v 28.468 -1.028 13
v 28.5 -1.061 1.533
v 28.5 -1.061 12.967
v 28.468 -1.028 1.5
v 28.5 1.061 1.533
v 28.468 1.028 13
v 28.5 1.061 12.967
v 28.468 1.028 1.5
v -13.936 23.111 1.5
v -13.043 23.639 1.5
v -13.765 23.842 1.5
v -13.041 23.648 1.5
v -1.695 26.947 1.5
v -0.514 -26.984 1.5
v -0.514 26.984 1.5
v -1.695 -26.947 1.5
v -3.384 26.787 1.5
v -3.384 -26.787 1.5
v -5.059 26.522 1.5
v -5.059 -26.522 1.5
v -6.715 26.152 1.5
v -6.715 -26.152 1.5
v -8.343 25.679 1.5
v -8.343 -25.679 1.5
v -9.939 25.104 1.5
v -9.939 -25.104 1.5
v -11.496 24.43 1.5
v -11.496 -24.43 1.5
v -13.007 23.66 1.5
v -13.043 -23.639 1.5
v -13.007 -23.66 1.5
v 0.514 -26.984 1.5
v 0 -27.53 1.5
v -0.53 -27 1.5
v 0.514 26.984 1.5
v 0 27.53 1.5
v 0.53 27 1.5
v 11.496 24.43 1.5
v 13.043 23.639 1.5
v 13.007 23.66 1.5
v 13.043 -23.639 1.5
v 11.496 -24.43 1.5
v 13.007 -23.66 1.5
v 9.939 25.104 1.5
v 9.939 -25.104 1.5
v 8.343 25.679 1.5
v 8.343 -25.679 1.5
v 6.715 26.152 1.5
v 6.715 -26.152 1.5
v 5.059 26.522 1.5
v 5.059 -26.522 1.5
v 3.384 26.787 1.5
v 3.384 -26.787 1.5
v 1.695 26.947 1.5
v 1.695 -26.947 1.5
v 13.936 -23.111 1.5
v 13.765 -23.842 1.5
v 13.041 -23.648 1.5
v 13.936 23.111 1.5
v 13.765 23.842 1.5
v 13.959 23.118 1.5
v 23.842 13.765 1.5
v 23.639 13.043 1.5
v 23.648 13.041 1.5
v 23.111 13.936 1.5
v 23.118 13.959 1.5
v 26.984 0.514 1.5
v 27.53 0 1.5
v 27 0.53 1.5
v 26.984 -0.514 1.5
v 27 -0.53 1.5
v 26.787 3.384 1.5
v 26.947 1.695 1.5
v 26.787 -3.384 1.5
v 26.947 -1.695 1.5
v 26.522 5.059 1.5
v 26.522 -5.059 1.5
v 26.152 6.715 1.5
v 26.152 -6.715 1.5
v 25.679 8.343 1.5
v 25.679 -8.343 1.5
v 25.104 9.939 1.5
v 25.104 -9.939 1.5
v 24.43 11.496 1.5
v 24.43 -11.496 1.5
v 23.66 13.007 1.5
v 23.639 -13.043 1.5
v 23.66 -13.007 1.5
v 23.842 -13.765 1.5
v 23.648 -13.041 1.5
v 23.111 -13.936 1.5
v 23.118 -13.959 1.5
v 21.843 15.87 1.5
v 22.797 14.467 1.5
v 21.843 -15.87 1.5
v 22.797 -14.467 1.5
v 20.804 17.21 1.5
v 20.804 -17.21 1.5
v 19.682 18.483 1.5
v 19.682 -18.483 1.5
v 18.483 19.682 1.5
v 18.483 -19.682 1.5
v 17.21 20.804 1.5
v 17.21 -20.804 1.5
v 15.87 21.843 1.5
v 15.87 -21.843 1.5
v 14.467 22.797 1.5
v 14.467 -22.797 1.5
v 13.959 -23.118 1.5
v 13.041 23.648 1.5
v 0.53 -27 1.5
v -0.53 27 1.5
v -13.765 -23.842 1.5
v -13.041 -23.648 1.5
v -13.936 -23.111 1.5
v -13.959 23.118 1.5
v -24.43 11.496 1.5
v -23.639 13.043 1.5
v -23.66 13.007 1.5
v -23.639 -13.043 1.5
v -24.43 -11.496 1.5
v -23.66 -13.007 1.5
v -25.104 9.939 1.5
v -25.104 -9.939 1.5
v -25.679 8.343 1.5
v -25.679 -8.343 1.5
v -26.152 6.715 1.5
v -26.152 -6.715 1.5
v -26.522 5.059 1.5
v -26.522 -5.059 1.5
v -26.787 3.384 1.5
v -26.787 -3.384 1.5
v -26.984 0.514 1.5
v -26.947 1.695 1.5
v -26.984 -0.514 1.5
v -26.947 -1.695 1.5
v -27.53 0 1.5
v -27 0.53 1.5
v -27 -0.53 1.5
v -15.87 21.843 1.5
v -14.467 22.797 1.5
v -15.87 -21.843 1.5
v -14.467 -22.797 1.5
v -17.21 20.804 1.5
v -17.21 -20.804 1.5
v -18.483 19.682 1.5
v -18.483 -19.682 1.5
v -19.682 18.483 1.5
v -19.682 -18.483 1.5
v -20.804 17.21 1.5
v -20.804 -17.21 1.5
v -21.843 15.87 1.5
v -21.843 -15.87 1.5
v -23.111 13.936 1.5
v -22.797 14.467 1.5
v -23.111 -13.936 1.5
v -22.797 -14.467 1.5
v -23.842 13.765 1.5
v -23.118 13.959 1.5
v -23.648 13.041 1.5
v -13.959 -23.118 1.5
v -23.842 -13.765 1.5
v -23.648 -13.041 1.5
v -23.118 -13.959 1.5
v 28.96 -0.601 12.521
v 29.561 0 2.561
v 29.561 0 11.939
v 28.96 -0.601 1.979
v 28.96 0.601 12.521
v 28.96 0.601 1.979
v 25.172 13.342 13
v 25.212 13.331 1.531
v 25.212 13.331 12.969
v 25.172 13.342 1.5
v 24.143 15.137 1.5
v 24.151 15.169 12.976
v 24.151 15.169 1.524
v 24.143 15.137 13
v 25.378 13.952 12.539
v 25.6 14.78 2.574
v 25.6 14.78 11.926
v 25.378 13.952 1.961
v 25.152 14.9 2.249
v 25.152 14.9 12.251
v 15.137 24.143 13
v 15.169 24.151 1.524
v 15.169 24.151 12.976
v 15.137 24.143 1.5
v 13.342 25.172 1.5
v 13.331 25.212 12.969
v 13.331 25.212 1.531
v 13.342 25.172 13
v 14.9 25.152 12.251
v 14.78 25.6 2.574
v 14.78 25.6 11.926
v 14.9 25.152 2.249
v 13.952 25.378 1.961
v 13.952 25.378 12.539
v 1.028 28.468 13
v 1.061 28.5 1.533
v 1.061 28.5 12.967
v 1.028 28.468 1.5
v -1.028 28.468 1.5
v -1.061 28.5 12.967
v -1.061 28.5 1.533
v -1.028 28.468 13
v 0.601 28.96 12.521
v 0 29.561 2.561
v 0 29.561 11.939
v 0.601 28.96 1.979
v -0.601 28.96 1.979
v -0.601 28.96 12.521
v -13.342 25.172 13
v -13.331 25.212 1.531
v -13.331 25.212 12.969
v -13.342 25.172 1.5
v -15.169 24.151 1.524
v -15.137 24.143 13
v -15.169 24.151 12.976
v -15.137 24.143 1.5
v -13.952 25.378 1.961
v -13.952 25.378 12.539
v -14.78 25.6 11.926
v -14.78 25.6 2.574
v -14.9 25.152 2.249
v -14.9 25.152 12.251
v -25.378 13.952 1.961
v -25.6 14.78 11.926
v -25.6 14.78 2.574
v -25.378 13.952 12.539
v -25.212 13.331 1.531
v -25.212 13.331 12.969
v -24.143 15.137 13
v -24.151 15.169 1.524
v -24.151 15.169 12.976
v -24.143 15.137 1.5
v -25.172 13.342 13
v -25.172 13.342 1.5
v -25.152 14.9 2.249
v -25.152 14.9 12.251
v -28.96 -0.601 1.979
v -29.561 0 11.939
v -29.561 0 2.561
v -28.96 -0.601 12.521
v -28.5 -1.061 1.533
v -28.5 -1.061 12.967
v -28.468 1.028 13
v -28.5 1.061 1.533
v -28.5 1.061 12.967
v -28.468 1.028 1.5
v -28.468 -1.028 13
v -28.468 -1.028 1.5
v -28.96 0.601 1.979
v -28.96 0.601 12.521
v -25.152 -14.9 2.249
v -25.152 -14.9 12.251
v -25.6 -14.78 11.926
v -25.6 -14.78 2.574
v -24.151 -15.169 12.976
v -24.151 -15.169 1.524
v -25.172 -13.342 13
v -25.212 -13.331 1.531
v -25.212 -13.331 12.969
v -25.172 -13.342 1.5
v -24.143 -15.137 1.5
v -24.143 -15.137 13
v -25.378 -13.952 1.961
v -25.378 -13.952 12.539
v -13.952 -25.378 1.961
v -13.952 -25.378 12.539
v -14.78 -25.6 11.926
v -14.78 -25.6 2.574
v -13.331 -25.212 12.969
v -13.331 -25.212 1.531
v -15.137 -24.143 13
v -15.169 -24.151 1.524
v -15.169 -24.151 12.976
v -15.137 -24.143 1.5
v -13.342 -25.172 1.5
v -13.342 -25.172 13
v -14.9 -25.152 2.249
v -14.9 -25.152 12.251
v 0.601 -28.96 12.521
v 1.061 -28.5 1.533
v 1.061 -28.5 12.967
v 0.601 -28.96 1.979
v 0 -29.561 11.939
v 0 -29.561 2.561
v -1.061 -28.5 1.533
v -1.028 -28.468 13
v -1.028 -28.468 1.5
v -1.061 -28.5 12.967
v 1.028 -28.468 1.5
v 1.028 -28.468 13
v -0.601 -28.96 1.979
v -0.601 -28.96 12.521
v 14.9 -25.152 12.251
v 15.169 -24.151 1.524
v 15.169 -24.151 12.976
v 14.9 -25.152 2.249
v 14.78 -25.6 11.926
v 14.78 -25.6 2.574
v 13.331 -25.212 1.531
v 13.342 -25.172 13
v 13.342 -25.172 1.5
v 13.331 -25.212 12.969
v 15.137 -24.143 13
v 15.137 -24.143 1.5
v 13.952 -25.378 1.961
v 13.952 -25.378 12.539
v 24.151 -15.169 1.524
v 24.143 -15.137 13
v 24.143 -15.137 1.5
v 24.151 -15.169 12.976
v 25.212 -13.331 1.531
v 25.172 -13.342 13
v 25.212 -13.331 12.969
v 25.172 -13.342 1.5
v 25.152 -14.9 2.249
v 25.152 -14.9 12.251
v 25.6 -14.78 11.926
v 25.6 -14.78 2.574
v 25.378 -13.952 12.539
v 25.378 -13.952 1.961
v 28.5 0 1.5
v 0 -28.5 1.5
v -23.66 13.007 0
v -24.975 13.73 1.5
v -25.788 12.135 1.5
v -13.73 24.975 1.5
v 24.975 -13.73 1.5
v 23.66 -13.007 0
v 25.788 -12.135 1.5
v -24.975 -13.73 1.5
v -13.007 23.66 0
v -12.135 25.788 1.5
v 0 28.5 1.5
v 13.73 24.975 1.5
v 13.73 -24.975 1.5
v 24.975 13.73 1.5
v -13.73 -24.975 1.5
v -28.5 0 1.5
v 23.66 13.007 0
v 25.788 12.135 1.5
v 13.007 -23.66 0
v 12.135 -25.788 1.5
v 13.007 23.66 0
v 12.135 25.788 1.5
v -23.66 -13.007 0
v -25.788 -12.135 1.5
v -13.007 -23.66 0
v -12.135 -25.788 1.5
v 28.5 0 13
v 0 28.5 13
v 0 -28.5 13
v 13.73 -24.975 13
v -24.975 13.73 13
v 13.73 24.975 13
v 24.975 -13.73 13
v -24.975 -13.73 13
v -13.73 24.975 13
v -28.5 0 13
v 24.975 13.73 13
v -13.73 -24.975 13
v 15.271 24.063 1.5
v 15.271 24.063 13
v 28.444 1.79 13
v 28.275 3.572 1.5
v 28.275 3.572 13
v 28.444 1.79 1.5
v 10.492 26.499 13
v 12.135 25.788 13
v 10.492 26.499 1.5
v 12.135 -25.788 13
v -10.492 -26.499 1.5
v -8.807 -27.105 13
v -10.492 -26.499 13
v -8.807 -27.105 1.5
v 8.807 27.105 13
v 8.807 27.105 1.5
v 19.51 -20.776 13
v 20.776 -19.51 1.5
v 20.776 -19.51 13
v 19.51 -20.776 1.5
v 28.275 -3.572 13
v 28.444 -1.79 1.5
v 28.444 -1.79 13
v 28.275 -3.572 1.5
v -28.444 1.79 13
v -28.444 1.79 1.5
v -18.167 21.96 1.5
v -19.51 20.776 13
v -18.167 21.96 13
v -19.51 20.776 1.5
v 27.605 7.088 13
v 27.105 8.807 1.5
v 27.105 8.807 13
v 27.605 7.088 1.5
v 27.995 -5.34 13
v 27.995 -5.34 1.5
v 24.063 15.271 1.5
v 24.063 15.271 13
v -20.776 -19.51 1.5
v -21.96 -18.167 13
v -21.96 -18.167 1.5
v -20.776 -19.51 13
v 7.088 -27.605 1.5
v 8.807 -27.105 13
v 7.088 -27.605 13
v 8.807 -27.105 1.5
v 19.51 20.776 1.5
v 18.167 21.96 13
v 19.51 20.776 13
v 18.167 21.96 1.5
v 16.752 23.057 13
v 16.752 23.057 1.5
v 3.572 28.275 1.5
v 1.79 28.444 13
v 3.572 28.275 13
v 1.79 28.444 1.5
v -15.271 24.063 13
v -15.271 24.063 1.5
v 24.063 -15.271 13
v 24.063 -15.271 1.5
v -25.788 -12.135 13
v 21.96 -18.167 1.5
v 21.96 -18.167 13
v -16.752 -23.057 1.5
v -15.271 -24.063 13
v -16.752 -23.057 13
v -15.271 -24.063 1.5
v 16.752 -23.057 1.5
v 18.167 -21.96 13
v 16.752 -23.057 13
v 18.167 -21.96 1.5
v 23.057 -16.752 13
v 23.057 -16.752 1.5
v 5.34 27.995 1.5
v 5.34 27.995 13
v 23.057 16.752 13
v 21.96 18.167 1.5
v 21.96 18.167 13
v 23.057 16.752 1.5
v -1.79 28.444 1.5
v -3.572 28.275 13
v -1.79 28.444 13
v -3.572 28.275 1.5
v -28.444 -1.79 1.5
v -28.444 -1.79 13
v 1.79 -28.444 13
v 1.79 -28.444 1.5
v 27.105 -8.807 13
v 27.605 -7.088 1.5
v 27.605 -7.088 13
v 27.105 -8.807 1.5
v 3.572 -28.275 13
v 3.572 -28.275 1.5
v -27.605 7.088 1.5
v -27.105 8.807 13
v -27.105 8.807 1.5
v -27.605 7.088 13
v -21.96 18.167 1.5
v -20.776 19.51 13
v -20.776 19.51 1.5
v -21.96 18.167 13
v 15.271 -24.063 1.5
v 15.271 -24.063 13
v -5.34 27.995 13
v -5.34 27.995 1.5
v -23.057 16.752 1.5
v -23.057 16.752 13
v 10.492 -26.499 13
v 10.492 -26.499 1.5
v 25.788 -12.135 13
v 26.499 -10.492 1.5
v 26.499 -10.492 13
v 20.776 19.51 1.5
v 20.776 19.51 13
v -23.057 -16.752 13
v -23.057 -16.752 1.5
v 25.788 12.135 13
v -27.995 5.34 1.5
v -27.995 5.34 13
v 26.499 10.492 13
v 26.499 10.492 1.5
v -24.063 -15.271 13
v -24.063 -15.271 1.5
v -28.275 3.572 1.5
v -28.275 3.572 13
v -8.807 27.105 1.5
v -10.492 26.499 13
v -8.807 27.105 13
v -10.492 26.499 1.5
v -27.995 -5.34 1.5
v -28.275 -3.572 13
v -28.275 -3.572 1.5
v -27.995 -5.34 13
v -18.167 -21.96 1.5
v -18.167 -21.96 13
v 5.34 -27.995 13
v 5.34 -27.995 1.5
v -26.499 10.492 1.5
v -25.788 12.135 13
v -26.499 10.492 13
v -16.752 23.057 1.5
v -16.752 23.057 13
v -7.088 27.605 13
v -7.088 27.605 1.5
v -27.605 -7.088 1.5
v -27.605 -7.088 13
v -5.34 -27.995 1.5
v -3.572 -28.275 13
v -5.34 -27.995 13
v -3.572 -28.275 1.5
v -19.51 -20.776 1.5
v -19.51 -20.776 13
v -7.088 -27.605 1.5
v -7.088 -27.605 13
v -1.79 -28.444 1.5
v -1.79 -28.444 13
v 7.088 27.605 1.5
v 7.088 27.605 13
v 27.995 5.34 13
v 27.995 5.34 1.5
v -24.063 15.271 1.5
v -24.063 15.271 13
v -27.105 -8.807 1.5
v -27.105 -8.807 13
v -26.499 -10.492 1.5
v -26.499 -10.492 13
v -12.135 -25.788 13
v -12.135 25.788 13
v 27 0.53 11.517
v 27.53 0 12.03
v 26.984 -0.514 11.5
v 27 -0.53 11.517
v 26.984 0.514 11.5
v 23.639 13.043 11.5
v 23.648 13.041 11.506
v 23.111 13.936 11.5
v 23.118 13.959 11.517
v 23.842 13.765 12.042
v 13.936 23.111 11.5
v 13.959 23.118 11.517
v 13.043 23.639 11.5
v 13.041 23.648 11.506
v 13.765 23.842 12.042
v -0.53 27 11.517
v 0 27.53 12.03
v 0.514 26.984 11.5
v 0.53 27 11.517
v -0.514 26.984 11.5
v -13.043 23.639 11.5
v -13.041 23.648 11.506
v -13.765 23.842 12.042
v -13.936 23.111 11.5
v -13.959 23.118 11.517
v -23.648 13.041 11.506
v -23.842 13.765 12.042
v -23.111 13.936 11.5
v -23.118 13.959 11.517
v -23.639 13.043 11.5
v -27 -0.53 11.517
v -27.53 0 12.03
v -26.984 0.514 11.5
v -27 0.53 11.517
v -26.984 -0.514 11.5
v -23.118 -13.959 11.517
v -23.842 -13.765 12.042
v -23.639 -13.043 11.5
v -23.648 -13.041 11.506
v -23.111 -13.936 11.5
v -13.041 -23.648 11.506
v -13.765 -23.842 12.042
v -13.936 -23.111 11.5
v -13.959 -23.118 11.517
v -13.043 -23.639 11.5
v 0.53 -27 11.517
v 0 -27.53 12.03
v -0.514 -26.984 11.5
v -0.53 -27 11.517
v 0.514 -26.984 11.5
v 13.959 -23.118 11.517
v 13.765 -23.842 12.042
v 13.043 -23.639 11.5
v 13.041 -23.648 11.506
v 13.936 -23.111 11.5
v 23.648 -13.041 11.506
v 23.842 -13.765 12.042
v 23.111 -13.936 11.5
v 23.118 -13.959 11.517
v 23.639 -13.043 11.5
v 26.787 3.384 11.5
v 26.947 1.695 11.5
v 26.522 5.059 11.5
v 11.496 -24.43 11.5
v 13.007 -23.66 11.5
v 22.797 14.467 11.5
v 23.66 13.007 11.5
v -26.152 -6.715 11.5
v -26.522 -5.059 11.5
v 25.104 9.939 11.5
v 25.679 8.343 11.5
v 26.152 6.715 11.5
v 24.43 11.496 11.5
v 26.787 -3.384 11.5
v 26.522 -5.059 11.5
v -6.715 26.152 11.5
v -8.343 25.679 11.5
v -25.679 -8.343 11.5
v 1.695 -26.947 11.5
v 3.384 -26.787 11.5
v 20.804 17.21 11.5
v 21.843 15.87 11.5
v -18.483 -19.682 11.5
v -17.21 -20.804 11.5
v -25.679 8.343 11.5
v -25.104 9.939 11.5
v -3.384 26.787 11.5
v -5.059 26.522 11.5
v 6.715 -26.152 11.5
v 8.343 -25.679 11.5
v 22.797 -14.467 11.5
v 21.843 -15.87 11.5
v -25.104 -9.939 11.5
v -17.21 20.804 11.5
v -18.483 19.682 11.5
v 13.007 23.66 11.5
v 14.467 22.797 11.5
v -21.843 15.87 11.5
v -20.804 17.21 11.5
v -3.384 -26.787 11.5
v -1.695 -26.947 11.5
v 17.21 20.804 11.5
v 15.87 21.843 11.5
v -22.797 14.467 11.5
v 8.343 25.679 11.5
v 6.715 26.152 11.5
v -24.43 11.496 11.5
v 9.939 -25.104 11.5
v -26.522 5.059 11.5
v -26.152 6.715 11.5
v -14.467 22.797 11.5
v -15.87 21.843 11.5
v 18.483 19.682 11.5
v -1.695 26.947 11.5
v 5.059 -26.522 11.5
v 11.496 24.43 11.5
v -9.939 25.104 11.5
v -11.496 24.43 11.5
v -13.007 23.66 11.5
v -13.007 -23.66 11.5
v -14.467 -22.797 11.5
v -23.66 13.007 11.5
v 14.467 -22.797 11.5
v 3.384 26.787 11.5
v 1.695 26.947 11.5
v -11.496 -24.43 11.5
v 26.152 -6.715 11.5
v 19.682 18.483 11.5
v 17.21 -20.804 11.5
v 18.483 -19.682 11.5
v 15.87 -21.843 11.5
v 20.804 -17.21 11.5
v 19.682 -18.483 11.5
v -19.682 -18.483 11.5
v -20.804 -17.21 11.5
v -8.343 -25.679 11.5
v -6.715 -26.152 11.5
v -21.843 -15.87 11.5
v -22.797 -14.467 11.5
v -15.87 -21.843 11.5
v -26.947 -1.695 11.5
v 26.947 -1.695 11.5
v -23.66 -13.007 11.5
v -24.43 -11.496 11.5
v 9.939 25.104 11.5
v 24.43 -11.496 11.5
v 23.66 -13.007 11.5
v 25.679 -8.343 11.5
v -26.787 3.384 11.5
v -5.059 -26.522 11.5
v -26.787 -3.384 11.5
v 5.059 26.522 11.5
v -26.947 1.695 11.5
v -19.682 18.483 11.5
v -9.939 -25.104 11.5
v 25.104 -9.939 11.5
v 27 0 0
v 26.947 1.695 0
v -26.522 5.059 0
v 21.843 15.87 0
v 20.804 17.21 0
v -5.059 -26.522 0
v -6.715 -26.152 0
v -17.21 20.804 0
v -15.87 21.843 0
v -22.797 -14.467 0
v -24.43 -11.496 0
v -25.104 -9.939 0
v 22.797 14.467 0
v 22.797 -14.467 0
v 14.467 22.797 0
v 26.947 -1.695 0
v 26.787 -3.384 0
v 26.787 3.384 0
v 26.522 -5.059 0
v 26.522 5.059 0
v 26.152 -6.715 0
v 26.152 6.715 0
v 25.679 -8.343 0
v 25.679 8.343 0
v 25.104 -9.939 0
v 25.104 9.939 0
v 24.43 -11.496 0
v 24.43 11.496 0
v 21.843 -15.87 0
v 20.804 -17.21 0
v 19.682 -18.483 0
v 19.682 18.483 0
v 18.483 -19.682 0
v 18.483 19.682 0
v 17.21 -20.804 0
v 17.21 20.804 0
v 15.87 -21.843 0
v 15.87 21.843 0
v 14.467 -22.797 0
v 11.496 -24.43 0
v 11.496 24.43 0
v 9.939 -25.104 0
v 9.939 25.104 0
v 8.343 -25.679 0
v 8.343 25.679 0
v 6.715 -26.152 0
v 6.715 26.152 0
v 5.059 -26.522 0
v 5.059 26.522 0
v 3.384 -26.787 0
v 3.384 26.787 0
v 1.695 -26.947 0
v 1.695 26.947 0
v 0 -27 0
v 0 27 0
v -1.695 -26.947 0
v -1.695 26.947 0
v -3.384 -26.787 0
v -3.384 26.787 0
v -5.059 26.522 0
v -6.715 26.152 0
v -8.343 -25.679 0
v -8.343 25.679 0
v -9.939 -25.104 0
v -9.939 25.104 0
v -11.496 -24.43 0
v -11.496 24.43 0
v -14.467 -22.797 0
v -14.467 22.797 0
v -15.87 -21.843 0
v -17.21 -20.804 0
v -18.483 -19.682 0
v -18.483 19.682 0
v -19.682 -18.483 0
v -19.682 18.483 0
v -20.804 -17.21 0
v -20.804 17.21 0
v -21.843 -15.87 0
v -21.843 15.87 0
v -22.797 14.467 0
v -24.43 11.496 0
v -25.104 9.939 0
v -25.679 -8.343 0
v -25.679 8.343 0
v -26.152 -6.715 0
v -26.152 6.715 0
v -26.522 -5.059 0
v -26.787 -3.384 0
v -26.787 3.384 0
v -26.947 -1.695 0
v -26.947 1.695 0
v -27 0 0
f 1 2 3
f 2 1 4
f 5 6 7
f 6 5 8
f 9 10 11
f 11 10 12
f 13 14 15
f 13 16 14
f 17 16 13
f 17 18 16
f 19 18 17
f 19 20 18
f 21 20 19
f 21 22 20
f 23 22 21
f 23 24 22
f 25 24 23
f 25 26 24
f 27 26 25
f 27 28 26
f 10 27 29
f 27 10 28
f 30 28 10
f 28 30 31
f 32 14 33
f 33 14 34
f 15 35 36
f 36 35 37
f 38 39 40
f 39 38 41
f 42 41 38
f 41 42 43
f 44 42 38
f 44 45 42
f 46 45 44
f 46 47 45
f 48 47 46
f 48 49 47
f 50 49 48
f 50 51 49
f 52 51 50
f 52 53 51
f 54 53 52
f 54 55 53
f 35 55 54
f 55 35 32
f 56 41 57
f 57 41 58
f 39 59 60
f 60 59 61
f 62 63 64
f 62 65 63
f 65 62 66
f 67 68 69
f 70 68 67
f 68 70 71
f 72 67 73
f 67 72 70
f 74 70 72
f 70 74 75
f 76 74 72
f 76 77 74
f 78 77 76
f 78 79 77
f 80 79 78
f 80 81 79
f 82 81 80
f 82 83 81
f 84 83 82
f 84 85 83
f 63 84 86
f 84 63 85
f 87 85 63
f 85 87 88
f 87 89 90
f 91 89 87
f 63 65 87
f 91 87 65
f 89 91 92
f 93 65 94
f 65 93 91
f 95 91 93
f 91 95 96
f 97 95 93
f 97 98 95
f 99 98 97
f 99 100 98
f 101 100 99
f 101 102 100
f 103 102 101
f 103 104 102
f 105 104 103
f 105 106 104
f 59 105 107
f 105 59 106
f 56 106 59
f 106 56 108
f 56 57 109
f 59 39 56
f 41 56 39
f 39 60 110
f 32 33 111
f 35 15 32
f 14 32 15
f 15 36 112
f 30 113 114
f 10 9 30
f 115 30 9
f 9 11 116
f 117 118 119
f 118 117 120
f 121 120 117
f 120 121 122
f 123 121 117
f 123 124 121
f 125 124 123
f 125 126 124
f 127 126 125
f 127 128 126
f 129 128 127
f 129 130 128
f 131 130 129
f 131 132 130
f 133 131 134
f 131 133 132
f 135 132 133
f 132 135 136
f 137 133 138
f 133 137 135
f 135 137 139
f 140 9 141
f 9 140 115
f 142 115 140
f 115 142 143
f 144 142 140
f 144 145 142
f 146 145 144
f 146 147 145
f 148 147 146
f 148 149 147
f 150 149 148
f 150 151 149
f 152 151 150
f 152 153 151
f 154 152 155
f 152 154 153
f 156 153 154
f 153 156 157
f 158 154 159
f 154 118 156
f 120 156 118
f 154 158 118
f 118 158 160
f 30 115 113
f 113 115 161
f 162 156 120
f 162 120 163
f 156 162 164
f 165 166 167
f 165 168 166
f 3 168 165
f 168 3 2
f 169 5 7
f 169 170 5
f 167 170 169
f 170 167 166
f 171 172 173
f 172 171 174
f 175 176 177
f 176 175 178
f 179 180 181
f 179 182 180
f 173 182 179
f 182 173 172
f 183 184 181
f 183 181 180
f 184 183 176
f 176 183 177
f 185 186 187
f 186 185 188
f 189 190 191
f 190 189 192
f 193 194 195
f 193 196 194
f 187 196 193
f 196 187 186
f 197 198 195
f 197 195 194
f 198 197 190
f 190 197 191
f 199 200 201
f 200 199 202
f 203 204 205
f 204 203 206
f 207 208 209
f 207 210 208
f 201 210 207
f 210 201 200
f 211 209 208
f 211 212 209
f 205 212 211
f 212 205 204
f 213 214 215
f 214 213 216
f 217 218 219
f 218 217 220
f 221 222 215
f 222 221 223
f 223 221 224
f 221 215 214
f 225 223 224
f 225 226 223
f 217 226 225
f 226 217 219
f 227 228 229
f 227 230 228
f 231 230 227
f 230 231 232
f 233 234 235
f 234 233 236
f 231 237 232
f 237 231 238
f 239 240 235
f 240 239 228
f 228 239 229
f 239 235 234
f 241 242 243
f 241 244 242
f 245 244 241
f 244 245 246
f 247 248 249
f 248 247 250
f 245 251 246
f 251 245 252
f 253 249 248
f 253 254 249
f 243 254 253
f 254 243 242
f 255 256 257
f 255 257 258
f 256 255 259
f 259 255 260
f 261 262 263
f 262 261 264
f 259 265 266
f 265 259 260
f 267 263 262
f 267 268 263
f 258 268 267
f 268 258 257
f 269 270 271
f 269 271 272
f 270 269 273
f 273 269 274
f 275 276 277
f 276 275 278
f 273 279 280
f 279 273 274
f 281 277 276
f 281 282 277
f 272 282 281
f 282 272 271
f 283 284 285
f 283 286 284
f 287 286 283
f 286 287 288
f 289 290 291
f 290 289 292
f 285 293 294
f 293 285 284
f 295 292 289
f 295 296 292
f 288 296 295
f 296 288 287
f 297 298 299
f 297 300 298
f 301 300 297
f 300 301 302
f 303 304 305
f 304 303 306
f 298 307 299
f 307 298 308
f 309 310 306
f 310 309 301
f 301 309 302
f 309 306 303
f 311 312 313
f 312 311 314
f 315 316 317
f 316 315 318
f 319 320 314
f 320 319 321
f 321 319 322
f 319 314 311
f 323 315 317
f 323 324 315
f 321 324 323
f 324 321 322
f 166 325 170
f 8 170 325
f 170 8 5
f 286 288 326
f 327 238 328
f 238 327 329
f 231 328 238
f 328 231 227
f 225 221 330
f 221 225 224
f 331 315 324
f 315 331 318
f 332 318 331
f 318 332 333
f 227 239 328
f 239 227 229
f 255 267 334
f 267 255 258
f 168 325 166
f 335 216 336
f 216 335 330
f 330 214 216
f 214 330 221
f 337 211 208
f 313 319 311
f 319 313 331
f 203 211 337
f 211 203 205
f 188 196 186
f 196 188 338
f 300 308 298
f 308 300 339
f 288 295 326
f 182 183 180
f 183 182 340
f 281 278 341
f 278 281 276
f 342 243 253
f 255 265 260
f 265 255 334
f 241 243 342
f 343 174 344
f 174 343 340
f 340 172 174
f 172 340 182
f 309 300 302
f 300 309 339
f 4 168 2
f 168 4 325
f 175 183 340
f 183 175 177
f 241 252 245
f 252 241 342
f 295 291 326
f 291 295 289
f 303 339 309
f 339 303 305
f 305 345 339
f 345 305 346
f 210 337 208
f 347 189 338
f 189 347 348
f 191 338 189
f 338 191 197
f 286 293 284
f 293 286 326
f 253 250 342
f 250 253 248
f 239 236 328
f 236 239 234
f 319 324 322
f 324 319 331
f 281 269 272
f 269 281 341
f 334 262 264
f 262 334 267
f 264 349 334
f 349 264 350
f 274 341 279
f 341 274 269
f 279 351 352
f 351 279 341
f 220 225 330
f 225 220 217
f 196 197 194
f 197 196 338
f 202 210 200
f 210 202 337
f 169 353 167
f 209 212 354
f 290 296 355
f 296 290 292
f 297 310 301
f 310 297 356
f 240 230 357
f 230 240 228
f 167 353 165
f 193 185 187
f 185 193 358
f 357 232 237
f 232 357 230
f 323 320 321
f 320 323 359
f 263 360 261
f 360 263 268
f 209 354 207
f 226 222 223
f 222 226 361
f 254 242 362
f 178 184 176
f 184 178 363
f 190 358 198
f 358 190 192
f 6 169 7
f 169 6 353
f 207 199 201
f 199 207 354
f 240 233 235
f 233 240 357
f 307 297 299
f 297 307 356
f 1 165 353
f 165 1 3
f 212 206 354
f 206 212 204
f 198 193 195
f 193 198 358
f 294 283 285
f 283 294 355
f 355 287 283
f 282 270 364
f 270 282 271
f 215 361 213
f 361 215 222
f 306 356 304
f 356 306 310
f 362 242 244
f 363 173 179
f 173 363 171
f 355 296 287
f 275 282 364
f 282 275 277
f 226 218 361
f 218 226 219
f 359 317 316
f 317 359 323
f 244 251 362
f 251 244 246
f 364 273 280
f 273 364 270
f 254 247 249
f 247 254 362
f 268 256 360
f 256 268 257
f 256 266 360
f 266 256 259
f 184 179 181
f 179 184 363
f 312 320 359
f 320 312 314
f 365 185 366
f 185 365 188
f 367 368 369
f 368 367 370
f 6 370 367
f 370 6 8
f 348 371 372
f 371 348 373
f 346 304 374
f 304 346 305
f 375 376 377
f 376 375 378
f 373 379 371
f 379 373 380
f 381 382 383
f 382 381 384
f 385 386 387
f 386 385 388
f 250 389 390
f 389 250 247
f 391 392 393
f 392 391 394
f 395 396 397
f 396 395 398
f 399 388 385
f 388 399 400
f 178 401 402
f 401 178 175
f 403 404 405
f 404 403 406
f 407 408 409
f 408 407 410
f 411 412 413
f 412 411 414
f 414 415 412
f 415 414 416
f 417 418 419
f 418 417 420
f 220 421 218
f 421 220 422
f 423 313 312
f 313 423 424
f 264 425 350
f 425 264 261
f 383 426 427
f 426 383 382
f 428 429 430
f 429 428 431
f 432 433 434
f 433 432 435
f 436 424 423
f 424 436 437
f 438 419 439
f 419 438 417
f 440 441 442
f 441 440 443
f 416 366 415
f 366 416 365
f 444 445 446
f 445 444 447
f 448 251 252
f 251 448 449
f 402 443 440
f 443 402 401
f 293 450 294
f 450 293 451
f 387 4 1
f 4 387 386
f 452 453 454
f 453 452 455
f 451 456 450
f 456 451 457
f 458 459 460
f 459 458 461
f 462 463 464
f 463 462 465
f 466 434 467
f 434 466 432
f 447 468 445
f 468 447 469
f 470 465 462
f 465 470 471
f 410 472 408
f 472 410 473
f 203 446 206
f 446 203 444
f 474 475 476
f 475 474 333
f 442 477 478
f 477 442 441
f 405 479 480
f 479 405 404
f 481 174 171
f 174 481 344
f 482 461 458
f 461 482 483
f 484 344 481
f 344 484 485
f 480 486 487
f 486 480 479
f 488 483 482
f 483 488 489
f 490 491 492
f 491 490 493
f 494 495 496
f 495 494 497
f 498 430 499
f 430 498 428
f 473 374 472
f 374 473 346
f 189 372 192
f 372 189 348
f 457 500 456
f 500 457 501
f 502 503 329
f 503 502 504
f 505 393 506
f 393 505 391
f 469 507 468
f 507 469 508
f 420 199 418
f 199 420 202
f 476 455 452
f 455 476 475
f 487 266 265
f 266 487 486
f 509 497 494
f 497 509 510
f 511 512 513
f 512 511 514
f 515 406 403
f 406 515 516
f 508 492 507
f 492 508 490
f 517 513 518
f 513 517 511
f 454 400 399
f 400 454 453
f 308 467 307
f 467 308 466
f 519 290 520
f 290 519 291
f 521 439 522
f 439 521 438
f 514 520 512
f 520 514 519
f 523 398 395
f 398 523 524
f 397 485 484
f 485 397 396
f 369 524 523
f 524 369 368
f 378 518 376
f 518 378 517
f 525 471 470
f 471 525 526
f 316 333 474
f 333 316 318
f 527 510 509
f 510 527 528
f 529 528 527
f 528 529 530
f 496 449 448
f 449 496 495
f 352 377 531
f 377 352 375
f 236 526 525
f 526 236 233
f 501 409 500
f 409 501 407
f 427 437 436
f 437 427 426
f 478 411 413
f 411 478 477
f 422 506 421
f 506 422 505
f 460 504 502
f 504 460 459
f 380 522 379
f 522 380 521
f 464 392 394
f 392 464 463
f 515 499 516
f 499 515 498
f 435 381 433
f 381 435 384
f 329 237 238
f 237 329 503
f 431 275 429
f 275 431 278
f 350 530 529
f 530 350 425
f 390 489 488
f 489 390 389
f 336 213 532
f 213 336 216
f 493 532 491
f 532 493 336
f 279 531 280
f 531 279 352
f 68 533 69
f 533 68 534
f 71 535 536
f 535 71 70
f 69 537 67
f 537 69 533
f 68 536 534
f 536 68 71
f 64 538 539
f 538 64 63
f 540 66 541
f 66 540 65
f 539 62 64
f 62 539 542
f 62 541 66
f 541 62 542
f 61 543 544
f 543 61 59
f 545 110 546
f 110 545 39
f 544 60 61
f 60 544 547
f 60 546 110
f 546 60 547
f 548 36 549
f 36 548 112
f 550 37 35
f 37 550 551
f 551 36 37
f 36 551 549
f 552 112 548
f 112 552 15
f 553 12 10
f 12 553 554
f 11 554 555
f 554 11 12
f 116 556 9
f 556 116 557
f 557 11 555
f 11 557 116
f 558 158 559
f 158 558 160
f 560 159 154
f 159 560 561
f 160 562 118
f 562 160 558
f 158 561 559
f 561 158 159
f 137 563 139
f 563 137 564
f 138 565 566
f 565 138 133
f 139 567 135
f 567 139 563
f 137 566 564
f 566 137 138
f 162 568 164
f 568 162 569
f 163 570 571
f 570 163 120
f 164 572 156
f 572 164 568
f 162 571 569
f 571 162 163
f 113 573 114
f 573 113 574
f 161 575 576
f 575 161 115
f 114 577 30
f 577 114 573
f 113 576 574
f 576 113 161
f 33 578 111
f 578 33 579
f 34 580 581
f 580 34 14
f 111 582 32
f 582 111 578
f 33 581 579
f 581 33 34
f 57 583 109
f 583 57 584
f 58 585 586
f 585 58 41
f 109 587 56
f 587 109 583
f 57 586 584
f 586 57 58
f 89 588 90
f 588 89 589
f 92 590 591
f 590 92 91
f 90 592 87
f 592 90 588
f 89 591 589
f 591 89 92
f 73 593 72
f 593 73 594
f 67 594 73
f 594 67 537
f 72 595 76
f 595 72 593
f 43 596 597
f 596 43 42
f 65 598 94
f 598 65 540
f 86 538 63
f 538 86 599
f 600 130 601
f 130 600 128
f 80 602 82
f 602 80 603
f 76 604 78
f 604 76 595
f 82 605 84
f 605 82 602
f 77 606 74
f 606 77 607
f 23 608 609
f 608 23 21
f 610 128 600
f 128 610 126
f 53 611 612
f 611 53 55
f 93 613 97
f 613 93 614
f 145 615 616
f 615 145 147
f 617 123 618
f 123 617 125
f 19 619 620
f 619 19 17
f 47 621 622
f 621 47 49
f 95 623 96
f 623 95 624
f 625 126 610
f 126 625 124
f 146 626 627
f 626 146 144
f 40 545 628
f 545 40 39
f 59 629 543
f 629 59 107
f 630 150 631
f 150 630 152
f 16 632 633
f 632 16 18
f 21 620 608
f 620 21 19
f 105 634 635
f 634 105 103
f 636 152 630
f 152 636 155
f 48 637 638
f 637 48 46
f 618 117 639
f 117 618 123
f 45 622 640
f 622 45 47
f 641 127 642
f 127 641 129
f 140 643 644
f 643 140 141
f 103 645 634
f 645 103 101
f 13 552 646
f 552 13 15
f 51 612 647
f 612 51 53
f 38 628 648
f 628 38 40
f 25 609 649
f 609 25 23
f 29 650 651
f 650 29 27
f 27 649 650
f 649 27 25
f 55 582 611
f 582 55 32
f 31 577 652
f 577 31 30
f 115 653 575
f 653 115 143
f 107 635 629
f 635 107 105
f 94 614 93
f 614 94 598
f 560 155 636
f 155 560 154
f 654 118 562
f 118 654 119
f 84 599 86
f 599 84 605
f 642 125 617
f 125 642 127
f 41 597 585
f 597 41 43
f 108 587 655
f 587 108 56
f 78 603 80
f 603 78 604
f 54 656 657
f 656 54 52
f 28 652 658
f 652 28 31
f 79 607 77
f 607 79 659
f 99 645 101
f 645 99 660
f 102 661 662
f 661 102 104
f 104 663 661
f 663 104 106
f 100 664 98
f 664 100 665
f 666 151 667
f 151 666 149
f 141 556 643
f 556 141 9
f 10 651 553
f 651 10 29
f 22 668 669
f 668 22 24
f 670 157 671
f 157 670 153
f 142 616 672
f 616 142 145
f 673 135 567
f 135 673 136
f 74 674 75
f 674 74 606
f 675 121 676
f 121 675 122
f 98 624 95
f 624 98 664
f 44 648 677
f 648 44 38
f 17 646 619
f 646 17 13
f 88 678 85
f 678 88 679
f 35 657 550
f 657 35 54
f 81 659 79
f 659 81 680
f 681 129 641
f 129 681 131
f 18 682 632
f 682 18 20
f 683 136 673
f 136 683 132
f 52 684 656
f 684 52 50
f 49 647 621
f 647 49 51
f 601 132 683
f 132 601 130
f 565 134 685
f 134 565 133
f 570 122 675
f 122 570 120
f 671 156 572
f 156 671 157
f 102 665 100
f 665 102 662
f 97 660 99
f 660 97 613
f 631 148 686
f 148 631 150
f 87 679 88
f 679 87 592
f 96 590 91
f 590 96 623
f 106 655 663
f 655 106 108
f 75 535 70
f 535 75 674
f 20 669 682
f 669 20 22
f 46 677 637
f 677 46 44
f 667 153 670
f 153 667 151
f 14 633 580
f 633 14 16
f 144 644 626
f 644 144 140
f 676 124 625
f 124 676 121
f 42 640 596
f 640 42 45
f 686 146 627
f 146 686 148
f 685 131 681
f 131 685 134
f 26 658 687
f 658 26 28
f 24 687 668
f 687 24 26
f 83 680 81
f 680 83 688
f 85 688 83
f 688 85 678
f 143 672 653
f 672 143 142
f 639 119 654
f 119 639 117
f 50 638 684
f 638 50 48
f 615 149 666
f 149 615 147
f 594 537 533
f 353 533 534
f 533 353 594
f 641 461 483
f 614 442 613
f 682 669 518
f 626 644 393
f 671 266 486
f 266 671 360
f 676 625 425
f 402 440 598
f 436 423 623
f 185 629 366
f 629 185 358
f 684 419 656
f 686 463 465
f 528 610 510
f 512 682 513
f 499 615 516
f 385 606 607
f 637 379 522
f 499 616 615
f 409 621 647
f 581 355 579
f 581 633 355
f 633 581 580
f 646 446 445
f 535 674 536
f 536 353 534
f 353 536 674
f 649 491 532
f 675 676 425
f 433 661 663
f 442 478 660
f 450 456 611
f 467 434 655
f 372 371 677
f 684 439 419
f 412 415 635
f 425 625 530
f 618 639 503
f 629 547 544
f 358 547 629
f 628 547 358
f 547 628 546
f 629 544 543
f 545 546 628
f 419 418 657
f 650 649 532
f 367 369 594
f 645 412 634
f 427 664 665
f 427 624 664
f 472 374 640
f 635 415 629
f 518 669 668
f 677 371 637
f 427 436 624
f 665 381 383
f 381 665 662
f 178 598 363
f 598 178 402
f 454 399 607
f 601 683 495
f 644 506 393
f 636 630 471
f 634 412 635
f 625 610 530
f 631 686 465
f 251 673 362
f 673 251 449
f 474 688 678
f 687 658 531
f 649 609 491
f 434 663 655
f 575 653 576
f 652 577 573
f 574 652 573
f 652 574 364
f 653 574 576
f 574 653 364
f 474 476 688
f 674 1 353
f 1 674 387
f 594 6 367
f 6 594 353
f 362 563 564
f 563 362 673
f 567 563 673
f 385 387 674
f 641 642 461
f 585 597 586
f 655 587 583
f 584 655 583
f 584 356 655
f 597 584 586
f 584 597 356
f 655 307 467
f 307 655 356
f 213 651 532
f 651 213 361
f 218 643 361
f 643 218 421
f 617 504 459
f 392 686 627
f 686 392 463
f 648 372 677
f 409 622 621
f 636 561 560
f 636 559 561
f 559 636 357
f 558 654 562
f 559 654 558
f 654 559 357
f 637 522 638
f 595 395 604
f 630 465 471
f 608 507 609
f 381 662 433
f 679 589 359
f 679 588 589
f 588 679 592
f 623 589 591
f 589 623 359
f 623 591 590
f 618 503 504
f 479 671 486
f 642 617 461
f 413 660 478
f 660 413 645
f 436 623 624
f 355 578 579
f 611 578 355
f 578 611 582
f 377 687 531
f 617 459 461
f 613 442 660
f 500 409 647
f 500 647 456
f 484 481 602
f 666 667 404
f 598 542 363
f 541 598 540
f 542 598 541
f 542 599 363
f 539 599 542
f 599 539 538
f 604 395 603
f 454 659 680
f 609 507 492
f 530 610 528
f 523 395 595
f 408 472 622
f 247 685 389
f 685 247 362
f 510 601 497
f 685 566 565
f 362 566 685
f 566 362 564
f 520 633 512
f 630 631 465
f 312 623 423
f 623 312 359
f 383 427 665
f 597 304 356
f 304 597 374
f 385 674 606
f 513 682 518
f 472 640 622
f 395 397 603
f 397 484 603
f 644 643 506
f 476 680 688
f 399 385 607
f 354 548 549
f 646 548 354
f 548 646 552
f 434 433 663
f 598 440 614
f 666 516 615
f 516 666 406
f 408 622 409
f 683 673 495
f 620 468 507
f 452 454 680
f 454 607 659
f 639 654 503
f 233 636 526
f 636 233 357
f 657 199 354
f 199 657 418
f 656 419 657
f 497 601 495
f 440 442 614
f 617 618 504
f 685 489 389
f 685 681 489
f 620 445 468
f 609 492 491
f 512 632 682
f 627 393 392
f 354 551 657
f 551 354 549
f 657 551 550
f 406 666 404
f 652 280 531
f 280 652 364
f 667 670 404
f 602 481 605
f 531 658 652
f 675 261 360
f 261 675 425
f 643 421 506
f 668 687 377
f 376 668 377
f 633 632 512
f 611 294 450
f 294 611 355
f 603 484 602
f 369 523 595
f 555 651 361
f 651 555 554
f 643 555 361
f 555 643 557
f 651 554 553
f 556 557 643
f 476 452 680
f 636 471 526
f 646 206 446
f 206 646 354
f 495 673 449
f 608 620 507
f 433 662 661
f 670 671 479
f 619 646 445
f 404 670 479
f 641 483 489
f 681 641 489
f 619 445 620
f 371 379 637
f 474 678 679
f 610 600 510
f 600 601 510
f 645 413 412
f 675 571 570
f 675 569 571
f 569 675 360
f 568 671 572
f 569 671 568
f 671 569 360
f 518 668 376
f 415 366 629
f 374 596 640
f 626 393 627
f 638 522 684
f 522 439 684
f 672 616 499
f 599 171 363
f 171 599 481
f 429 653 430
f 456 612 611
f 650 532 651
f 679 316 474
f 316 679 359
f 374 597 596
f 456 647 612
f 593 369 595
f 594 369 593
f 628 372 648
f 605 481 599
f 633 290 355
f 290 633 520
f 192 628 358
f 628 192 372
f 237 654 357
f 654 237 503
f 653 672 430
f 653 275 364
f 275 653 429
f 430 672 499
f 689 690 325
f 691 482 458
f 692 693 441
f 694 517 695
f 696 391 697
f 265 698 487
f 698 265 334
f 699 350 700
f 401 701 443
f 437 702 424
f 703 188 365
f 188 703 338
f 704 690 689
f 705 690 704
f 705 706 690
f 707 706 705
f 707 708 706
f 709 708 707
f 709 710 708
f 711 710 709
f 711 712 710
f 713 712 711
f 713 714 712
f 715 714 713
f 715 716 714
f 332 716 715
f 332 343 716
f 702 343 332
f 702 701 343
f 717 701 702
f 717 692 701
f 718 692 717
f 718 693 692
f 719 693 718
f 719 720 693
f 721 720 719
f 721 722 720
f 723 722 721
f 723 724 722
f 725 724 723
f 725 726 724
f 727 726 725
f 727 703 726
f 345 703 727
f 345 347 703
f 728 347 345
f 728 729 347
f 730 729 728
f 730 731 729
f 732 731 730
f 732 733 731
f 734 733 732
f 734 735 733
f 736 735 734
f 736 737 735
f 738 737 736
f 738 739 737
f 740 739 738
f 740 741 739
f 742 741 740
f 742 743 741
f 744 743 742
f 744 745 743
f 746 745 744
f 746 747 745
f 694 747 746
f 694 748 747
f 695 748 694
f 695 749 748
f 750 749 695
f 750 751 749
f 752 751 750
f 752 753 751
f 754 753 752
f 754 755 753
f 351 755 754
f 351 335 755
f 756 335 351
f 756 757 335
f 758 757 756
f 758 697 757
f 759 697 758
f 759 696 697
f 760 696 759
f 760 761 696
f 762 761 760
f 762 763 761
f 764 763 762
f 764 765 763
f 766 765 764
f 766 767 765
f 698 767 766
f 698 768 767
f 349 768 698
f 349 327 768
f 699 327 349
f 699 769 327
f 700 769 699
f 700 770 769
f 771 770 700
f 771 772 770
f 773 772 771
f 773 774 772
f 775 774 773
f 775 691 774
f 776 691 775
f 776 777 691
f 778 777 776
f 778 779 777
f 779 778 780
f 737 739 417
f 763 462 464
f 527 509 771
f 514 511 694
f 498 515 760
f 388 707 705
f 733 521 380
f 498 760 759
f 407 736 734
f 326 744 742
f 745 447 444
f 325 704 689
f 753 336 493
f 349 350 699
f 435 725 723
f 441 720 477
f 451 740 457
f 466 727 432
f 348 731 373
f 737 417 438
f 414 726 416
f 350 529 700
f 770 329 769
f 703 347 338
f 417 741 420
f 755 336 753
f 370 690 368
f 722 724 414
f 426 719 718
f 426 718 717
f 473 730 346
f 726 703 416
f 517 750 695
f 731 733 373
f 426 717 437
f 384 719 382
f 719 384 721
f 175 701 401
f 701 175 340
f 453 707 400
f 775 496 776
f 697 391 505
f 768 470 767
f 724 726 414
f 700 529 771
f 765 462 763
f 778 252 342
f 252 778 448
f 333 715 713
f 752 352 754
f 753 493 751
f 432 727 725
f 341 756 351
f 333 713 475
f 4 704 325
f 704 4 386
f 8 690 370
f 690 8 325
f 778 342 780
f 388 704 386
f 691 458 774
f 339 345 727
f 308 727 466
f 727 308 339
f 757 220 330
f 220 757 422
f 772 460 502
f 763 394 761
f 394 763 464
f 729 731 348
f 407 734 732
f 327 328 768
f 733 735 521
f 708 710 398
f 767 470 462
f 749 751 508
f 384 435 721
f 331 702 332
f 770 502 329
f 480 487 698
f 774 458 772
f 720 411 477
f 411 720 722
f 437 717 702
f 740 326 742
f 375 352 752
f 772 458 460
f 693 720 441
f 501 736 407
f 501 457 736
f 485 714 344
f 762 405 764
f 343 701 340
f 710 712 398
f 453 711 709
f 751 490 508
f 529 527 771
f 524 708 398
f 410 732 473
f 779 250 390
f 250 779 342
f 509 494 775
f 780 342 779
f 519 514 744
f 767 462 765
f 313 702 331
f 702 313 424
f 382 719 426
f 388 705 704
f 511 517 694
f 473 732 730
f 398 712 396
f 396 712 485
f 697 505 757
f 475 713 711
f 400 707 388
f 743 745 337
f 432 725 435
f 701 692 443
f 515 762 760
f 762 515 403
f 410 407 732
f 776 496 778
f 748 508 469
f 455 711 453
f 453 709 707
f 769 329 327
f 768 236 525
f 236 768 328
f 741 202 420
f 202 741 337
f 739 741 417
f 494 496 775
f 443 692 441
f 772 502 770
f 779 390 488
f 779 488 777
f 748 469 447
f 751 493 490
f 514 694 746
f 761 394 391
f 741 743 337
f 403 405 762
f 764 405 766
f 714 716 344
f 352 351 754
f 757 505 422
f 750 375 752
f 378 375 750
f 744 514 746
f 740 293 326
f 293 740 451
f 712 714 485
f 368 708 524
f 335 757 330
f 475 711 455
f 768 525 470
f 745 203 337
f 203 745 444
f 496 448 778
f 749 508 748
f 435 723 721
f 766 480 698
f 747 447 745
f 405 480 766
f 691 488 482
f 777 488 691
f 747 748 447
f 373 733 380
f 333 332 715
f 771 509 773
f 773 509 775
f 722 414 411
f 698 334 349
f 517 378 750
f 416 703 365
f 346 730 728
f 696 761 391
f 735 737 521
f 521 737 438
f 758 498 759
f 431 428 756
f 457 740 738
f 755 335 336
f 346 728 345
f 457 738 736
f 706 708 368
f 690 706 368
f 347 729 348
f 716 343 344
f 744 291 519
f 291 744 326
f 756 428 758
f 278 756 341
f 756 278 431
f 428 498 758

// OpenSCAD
$fn=100;

d1 = 54;
h1 = 13;

tt = 1.5;
aa = 30;

cylinder(d1=d1,d2=d1+2*tt,h=tt);
    
translate([0,0,tt]) {
    difference() {
        union() {
            cylinder(d=d1+2*tt,h=h1-tt);
            intersection() {
                for (a = [0:aa:360]) {
                    rotate([0,0,a]) {
                        translate([d1/2+tt,0,(h1-tt)/2]) {
                            rotate([0,0,45]) {
                                cube([tt,tt,h1-tt], center=true);
                            }
                        }
                    }
                }
                union() {
                    cylinder(d1=d1+2*tt,d2=d1+4*tt,h=tt);
                    translate([0,0,tt]) cylinder(d=d1+4*tt,h=h1-3*tt);
                    translate([0,0,h1-2*tt]) cylinder(d1=d1+4*tt,d2=d1+2*tt,h=tt);
                }
            }
        }
        cylinder(d=d1,h=h1);
        translate([0,0,h1-2*tt]) cylinder(d1=d1,d2=d1+2*tt,h=tt);
        for (a = [0:aa:360]) {
            rotate([0,0,a]) {
                translate([d1/2,0,h1/2]) {
                    rotate([0,0,45]) {
                        cube([tt/2,tt/2,h1], center=true);
                    }
                }
            }
        }
    }
}
